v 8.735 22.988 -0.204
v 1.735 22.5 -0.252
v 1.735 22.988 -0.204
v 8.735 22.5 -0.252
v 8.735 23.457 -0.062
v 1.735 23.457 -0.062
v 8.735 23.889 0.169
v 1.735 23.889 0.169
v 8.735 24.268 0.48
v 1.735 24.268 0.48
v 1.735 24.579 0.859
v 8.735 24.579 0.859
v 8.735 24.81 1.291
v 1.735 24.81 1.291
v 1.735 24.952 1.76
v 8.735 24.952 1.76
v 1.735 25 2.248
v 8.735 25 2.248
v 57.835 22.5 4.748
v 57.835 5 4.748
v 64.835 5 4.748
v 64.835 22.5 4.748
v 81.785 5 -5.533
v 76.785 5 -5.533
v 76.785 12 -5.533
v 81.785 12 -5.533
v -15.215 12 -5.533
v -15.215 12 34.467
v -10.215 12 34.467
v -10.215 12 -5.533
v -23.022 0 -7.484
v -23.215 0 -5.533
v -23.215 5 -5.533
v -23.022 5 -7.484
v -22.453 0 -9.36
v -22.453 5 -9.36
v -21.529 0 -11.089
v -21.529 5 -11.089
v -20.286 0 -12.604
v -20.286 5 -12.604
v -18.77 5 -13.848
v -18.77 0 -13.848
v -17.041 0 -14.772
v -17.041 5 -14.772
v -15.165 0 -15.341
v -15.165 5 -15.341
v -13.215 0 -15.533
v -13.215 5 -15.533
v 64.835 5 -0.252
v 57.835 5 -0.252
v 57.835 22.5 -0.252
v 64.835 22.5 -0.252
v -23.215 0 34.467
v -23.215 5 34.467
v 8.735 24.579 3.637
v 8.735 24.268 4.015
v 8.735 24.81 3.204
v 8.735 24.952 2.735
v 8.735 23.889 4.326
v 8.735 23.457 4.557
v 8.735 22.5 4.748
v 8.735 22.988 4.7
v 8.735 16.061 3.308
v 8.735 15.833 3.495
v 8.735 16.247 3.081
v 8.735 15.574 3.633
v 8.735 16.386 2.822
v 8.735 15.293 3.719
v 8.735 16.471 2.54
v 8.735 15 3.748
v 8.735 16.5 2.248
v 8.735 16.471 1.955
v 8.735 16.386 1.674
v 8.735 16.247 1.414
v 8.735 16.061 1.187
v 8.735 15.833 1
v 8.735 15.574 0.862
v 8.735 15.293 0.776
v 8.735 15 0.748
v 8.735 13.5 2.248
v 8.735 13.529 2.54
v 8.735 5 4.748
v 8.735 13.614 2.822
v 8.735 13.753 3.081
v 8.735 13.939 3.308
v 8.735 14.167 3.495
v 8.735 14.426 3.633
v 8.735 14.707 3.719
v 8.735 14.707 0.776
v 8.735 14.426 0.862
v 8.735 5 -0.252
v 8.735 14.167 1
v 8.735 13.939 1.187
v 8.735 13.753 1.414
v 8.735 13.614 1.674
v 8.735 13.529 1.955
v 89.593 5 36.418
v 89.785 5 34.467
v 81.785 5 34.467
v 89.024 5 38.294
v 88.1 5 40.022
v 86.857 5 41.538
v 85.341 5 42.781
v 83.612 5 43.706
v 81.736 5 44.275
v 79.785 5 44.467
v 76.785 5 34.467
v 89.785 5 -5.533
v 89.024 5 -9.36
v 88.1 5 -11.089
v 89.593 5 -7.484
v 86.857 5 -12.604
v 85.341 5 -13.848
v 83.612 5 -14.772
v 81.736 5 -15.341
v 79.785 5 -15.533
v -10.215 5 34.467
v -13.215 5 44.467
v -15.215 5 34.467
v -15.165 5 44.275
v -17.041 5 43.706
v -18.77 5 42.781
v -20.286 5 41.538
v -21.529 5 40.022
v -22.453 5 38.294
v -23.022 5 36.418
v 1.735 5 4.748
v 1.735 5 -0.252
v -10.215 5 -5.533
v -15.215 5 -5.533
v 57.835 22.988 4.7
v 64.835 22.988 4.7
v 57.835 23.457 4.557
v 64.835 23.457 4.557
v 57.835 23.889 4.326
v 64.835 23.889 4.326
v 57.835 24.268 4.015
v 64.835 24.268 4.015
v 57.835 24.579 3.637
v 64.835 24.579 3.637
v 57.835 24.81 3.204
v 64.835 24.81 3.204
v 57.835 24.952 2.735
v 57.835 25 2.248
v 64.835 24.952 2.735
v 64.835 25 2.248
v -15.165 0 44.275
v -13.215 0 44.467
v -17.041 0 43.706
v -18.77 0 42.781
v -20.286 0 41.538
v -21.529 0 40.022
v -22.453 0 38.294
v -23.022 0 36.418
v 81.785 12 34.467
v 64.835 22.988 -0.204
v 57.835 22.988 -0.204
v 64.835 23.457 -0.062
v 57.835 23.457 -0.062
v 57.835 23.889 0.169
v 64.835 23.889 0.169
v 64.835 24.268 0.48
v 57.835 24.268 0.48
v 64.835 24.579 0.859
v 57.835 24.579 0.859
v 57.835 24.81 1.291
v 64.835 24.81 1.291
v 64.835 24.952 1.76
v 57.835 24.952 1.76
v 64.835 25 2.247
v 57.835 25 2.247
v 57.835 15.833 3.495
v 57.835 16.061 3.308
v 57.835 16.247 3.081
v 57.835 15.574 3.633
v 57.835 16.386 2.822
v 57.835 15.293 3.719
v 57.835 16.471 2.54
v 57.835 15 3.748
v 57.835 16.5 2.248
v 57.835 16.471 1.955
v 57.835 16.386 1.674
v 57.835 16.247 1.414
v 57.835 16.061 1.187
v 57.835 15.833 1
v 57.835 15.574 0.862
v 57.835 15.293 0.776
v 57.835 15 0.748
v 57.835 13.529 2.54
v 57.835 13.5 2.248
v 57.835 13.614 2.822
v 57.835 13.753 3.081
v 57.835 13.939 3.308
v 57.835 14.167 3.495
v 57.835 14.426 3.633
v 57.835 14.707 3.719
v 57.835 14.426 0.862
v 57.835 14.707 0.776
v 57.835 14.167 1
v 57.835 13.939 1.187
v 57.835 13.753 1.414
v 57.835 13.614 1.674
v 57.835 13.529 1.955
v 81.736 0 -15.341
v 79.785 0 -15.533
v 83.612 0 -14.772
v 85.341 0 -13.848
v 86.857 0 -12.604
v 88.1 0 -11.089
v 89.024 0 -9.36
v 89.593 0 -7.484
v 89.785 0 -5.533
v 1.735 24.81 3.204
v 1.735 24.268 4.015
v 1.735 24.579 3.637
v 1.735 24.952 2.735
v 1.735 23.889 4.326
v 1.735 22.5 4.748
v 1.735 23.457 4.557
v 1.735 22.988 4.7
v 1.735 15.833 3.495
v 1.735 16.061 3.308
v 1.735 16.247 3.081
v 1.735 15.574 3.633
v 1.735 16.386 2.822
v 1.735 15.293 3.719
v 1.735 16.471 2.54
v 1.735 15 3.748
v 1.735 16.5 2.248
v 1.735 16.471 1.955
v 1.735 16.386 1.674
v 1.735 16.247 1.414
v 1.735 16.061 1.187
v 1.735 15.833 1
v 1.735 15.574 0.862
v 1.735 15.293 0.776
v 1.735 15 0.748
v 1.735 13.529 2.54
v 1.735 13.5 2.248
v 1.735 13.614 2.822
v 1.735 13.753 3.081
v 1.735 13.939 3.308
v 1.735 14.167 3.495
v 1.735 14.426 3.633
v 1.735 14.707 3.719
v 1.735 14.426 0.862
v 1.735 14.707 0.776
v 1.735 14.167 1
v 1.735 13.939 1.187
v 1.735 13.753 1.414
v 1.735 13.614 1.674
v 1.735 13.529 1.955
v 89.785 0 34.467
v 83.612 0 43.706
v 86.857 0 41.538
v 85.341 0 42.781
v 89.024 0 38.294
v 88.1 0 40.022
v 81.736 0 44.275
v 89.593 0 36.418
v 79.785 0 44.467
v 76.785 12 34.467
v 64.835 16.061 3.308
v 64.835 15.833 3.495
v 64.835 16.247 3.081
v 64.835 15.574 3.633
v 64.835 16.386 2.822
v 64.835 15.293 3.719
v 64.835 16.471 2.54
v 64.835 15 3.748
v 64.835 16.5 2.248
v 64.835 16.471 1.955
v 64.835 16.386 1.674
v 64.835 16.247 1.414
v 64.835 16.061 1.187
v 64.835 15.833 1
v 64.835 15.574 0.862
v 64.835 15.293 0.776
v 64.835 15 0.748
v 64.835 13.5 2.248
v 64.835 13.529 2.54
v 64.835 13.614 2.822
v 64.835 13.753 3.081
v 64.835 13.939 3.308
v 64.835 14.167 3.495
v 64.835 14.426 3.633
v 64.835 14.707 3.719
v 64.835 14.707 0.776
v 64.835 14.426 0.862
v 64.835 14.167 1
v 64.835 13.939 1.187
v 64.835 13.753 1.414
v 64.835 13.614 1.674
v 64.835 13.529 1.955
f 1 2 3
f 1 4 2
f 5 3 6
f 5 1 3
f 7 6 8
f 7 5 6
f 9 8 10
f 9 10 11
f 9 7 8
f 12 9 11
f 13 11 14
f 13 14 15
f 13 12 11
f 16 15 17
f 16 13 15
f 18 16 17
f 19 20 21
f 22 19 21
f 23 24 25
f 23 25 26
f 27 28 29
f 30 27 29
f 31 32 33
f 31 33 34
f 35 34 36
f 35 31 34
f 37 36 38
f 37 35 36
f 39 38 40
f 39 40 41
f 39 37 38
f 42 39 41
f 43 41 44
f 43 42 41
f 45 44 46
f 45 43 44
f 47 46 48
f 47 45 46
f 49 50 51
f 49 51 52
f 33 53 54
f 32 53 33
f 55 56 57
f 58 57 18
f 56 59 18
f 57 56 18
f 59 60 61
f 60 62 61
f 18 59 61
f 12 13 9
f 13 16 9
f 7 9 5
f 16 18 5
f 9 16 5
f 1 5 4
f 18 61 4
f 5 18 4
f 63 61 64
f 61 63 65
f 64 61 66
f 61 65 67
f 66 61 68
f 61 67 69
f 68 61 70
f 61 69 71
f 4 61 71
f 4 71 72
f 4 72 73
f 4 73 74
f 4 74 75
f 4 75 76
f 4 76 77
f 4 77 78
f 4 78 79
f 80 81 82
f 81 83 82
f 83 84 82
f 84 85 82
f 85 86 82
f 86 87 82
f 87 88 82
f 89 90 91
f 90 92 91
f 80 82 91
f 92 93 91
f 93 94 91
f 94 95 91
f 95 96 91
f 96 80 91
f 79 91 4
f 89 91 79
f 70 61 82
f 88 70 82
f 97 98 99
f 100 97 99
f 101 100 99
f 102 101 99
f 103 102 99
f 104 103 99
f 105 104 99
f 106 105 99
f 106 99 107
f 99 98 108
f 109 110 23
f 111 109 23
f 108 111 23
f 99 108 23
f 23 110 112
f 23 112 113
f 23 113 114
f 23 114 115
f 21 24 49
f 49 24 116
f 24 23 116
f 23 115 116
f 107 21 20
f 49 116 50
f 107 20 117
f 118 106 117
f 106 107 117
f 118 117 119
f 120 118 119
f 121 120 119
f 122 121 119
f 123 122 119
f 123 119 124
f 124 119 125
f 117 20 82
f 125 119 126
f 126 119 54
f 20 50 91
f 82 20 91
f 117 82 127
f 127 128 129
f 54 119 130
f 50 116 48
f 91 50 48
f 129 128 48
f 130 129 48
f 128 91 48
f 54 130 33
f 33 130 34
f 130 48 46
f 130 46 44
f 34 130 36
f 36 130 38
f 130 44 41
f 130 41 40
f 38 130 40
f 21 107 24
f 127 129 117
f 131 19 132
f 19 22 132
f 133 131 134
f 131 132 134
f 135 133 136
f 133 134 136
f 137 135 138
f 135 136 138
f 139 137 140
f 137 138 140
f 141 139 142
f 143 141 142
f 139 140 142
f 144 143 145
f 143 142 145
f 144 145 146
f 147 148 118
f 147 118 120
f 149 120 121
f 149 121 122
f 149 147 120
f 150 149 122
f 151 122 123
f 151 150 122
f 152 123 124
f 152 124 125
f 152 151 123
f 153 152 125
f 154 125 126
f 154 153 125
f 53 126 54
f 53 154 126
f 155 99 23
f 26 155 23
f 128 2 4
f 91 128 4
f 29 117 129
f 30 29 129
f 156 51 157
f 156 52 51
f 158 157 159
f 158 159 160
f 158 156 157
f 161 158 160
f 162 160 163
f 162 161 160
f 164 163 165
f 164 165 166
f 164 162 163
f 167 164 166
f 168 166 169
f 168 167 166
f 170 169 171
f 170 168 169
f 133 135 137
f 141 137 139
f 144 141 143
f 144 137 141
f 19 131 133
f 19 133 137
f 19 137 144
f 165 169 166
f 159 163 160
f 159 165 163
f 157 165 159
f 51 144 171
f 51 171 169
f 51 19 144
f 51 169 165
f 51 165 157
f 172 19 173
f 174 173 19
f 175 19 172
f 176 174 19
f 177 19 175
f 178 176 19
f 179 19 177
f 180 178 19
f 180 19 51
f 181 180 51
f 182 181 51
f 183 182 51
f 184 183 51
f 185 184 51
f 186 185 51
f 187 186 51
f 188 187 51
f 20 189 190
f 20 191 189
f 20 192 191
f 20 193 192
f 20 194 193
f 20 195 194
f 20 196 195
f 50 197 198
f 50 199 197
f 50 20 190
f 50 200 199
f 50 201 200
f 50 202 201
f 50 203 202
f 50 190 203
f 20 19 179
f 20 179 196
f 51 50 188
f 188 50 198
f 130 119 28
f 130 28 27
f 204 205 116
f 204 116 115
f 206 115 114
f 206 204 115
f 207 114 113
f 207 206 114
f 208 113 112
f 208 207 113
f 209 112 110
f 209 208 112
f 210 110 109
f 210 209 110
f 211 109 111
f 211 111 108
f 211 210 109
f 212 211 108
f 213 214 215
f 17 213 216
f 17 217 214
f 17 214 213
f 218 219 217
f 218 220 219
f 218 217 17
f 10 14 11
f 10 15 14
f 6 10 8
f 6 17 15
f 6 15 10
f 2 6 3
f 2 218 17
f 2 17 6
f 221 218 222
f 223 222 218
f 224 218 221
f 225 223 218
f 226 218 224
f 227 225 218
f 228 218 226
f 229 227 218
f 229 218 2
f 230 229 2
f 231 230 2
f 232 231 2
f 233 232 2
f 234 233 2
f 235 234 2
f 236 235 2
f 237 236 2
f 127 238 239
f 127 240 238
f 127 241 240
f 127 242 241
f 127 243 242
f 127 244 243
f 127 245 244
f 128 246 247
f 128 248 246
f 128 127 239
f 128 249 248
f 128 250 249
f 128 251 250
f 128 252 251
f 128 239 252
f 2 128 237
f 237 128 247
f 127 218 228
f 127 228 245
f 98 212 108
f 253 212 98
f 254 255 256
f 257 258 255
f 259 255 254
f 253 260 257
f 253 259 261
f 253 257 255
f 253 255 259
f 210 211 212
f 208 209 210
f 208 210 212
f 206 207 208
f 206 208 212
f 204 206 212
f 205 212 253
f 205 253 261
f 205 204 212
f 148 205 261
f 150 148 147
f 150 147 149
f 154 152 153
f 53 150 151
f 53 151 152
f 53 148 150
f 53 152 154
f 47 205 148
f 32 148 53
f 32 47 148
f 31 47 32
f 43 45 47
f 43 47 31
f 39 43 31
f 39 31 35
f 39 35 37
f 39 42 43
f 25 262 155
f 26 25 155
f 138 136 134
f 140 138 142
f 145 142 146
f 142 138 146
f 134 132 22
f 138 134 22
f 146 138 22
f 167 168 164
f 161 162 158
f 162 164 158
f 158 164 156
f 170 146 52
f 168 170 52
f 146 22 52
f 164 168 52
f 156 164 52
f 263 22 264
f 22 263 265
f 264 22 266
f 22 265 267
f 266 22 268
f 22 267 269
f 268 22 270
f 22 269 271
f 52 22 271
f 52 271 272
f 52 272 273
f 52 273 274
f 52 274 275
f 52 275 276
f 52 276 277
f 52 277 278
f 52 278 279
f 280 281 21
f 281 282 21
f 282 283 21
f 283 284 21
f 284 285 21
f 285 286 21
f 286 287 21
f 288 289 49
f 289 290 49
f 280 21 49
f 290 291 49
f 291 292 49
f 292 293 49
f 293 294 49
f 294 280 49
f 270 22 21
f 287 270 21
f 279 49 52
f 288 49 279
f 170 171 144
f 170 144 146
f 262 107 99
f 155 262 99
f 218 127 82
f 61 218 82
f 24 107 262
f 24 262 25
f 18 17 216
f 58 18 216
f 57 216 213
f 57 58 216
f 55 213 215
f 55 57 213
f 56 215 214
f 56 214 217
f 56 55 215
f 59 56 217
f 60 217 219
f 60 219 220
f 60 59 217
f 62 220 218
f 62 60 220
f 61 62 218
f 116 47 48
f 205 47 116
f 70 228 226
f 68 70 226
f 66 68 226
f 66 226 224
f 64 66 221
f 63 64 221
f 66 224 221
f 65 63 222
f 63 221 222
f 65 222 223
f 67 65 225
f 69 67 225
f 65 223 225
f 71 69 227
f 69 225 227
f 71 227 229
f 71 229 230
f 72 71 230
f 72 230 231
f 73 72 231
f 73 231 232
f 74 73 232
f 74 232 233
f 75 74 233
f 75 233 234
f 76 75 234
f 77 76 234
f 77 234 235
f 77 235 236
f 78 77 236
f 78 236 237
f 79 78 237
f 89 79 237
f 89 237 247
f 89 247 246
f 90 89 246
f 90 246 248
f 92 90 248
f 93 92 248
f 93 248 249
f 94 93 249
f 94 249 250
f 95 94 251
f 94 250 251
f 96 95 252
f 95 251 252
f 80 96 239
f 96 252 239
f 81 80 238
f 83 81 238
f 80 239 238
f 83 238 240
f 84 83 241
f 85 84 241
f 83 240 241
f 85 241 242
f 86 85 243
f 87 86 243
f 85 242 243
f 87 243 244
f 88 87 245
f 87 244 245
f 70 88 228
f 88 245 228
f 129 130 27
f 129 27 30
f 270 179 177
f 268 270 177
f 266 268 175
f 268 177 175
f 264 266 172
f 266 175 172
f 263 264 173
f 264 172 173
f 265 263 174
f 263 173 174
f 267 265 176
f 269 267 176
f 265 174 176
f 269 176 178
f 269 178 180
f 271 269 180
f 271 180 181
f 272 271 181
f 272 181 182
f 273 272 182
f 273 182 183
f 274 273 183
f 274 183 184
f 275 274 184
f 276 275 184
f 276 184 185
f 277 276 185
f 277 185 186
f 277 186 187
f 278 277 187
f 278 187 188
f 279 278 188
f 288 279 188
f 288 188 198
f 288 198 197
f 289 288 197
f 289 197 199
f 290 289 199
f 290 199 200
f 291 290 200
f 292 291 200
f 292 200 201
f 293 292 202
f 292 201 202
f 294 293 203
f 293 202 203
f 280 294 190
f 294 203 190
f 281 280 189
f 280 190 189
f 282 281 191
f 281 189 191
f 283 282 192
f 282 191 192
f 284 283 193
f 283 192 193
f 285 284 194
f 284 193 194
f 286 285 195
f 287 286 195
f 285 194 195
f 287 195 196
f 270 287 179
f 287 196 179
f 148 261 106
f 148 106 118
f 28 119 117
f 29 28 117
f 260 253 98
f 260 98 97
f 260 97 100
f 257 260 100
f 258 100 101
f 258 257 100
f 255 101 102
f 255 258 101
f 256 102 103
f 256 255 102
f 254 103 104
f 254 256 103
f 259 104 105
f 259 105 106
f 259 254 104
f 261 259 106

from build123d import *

# Parameters (mm, degrees)
RESSALTO_EXTRUS_O1_DEPTH = 5
ESBO_O2_W                = 7
ESBO_O2_H                = 5
RESSALTO_EXTRUS_O2_DEPTH = 20
ESBO_O4_R                = 1.5
CORTE_EXTRUS_O1_DEPTH    = 102.759991649
ESBO_O5_W                = 5
ESBO_O5_H                = 40
RESSALTO_EXTRUS_O3_DEPTH = 7
FILETE1_R                = 2.5
FILETE2_R                = 2.5
FILETE3_R                = 2.5


with BuildPart() as part:
    # Esboço1 → Ressalto-extrusão1 (new body)
    with BuildSketch(Plane(origin=(0, 0, 0), x_dir=(1, 0, 0), z_dir=(0, 1, 0))):
        with BuildLine():
            Line((-13.214501511, 15.533232628), (79.785498489, 15.533232628))
            ThreePointArc((79.785498489, 15.533232628), (86.856566301, 12.60430044), (89.785498489, 5.533232628))
            Line((89.785498489, 5.533232628), (89.785498489, -34.466767372))
            ThreePointArc((89.785498489, -34.466767372), (86.856566301, -41.537835183), (79.785498489, -44.466767372))
            Line((79.785498489, -44.466767372), (-13.214501511, -44.466767372))
            ThreePointArc((-13.214501511, -44.466767372), (-20.285569322, -41.537835183), (-23.214501511, -34.466767372))
            Line((-23.214501511, -34.466767372), (-23.214501511, 5.533232628))
            ThreePointArc((-23.214501511, 5.533232628), (-20.285569322, 12.60430044), (-13.214501511, 15.533232628))
        make_face()
    extrude(amount=RESSALTO_EXTRUS_O1_DEPTH)

    # Esboço2 → Ressalto-extrusão2 (add)
    with BuildSketch(Plane(origin=(0, 5, 0), x_dir=(1, 0, 0), z_dir=(0, 1, 0))):
        with Locations((61.335498489, -2.247557162)):
            Rectangle(ESBO_O2_W, ESBO_O2_H)
        with Locations((5.235498489, -2.247557162)):
            Rectangle(ESBO_O2_W, ESBO_O2_H)
    extrude(amount=RESSALTO_EXTRUS_O2_DEPTH)

    # Esboço4 → Corte-extrusão1 (cut, through all)
    with BuildSketch(Plane.ZY.offset(-1.735498489)):
        with Locations((2.247557162, 15)):
            Circle(ESBO_O4_R)
    extrude(amount=-CORTE_EXTRUS_O1_DEPTH, mode=Mode.SUBTRACT)

    # Esboço5 → Ressalto-extrusão3 (add)
    with BuildSketch(Plane(origin=(0, 5, 0), x_dir=(1, 0, 0), z_dir=(0, 1, 0))):
        with Locations((-12.714501511, -14.466767372)):
            Rectangle(ESBO_O5_W, ESBO_O5_H)
        with Locations((79.285498489, -14.466767372)):
            Rectangle(ESBO_O5_W, ESBO_O5_H)
    extrude(amount=RESSALTO_EXTRUS_O3_DEPTH)

    # Filete1
    filete1_edges = [part.edges().sort_by_distance(p)[0] for p in [
        (5.235498489, 25, -0.252442838),
    ]]
    fillet(filete1_edges, radius=FILETE1_R)

    # Filete2
    filete2_edges = [part.edges().sort_by_distance(p)[0] for p in [
        (5.235498489, 25, 4.747557162),
    ]]
    fillet(filete2_edges, radius=FILETE2_R - 0.0001)  # a hair under: the kernel refuses the full size

    # Filete3
    filete3_edges = [part.edges().sort_by_distance(p)[0] for p in [
        (61.335498489, 25, 4.747557162),
        (61.335498489, 25, -0.252442838),
    ]]
    fillet(filete3_edges, radius=FILETE3_R - 0.0001)  # a hair under: the kernel refuses the full size


solid = part.part
